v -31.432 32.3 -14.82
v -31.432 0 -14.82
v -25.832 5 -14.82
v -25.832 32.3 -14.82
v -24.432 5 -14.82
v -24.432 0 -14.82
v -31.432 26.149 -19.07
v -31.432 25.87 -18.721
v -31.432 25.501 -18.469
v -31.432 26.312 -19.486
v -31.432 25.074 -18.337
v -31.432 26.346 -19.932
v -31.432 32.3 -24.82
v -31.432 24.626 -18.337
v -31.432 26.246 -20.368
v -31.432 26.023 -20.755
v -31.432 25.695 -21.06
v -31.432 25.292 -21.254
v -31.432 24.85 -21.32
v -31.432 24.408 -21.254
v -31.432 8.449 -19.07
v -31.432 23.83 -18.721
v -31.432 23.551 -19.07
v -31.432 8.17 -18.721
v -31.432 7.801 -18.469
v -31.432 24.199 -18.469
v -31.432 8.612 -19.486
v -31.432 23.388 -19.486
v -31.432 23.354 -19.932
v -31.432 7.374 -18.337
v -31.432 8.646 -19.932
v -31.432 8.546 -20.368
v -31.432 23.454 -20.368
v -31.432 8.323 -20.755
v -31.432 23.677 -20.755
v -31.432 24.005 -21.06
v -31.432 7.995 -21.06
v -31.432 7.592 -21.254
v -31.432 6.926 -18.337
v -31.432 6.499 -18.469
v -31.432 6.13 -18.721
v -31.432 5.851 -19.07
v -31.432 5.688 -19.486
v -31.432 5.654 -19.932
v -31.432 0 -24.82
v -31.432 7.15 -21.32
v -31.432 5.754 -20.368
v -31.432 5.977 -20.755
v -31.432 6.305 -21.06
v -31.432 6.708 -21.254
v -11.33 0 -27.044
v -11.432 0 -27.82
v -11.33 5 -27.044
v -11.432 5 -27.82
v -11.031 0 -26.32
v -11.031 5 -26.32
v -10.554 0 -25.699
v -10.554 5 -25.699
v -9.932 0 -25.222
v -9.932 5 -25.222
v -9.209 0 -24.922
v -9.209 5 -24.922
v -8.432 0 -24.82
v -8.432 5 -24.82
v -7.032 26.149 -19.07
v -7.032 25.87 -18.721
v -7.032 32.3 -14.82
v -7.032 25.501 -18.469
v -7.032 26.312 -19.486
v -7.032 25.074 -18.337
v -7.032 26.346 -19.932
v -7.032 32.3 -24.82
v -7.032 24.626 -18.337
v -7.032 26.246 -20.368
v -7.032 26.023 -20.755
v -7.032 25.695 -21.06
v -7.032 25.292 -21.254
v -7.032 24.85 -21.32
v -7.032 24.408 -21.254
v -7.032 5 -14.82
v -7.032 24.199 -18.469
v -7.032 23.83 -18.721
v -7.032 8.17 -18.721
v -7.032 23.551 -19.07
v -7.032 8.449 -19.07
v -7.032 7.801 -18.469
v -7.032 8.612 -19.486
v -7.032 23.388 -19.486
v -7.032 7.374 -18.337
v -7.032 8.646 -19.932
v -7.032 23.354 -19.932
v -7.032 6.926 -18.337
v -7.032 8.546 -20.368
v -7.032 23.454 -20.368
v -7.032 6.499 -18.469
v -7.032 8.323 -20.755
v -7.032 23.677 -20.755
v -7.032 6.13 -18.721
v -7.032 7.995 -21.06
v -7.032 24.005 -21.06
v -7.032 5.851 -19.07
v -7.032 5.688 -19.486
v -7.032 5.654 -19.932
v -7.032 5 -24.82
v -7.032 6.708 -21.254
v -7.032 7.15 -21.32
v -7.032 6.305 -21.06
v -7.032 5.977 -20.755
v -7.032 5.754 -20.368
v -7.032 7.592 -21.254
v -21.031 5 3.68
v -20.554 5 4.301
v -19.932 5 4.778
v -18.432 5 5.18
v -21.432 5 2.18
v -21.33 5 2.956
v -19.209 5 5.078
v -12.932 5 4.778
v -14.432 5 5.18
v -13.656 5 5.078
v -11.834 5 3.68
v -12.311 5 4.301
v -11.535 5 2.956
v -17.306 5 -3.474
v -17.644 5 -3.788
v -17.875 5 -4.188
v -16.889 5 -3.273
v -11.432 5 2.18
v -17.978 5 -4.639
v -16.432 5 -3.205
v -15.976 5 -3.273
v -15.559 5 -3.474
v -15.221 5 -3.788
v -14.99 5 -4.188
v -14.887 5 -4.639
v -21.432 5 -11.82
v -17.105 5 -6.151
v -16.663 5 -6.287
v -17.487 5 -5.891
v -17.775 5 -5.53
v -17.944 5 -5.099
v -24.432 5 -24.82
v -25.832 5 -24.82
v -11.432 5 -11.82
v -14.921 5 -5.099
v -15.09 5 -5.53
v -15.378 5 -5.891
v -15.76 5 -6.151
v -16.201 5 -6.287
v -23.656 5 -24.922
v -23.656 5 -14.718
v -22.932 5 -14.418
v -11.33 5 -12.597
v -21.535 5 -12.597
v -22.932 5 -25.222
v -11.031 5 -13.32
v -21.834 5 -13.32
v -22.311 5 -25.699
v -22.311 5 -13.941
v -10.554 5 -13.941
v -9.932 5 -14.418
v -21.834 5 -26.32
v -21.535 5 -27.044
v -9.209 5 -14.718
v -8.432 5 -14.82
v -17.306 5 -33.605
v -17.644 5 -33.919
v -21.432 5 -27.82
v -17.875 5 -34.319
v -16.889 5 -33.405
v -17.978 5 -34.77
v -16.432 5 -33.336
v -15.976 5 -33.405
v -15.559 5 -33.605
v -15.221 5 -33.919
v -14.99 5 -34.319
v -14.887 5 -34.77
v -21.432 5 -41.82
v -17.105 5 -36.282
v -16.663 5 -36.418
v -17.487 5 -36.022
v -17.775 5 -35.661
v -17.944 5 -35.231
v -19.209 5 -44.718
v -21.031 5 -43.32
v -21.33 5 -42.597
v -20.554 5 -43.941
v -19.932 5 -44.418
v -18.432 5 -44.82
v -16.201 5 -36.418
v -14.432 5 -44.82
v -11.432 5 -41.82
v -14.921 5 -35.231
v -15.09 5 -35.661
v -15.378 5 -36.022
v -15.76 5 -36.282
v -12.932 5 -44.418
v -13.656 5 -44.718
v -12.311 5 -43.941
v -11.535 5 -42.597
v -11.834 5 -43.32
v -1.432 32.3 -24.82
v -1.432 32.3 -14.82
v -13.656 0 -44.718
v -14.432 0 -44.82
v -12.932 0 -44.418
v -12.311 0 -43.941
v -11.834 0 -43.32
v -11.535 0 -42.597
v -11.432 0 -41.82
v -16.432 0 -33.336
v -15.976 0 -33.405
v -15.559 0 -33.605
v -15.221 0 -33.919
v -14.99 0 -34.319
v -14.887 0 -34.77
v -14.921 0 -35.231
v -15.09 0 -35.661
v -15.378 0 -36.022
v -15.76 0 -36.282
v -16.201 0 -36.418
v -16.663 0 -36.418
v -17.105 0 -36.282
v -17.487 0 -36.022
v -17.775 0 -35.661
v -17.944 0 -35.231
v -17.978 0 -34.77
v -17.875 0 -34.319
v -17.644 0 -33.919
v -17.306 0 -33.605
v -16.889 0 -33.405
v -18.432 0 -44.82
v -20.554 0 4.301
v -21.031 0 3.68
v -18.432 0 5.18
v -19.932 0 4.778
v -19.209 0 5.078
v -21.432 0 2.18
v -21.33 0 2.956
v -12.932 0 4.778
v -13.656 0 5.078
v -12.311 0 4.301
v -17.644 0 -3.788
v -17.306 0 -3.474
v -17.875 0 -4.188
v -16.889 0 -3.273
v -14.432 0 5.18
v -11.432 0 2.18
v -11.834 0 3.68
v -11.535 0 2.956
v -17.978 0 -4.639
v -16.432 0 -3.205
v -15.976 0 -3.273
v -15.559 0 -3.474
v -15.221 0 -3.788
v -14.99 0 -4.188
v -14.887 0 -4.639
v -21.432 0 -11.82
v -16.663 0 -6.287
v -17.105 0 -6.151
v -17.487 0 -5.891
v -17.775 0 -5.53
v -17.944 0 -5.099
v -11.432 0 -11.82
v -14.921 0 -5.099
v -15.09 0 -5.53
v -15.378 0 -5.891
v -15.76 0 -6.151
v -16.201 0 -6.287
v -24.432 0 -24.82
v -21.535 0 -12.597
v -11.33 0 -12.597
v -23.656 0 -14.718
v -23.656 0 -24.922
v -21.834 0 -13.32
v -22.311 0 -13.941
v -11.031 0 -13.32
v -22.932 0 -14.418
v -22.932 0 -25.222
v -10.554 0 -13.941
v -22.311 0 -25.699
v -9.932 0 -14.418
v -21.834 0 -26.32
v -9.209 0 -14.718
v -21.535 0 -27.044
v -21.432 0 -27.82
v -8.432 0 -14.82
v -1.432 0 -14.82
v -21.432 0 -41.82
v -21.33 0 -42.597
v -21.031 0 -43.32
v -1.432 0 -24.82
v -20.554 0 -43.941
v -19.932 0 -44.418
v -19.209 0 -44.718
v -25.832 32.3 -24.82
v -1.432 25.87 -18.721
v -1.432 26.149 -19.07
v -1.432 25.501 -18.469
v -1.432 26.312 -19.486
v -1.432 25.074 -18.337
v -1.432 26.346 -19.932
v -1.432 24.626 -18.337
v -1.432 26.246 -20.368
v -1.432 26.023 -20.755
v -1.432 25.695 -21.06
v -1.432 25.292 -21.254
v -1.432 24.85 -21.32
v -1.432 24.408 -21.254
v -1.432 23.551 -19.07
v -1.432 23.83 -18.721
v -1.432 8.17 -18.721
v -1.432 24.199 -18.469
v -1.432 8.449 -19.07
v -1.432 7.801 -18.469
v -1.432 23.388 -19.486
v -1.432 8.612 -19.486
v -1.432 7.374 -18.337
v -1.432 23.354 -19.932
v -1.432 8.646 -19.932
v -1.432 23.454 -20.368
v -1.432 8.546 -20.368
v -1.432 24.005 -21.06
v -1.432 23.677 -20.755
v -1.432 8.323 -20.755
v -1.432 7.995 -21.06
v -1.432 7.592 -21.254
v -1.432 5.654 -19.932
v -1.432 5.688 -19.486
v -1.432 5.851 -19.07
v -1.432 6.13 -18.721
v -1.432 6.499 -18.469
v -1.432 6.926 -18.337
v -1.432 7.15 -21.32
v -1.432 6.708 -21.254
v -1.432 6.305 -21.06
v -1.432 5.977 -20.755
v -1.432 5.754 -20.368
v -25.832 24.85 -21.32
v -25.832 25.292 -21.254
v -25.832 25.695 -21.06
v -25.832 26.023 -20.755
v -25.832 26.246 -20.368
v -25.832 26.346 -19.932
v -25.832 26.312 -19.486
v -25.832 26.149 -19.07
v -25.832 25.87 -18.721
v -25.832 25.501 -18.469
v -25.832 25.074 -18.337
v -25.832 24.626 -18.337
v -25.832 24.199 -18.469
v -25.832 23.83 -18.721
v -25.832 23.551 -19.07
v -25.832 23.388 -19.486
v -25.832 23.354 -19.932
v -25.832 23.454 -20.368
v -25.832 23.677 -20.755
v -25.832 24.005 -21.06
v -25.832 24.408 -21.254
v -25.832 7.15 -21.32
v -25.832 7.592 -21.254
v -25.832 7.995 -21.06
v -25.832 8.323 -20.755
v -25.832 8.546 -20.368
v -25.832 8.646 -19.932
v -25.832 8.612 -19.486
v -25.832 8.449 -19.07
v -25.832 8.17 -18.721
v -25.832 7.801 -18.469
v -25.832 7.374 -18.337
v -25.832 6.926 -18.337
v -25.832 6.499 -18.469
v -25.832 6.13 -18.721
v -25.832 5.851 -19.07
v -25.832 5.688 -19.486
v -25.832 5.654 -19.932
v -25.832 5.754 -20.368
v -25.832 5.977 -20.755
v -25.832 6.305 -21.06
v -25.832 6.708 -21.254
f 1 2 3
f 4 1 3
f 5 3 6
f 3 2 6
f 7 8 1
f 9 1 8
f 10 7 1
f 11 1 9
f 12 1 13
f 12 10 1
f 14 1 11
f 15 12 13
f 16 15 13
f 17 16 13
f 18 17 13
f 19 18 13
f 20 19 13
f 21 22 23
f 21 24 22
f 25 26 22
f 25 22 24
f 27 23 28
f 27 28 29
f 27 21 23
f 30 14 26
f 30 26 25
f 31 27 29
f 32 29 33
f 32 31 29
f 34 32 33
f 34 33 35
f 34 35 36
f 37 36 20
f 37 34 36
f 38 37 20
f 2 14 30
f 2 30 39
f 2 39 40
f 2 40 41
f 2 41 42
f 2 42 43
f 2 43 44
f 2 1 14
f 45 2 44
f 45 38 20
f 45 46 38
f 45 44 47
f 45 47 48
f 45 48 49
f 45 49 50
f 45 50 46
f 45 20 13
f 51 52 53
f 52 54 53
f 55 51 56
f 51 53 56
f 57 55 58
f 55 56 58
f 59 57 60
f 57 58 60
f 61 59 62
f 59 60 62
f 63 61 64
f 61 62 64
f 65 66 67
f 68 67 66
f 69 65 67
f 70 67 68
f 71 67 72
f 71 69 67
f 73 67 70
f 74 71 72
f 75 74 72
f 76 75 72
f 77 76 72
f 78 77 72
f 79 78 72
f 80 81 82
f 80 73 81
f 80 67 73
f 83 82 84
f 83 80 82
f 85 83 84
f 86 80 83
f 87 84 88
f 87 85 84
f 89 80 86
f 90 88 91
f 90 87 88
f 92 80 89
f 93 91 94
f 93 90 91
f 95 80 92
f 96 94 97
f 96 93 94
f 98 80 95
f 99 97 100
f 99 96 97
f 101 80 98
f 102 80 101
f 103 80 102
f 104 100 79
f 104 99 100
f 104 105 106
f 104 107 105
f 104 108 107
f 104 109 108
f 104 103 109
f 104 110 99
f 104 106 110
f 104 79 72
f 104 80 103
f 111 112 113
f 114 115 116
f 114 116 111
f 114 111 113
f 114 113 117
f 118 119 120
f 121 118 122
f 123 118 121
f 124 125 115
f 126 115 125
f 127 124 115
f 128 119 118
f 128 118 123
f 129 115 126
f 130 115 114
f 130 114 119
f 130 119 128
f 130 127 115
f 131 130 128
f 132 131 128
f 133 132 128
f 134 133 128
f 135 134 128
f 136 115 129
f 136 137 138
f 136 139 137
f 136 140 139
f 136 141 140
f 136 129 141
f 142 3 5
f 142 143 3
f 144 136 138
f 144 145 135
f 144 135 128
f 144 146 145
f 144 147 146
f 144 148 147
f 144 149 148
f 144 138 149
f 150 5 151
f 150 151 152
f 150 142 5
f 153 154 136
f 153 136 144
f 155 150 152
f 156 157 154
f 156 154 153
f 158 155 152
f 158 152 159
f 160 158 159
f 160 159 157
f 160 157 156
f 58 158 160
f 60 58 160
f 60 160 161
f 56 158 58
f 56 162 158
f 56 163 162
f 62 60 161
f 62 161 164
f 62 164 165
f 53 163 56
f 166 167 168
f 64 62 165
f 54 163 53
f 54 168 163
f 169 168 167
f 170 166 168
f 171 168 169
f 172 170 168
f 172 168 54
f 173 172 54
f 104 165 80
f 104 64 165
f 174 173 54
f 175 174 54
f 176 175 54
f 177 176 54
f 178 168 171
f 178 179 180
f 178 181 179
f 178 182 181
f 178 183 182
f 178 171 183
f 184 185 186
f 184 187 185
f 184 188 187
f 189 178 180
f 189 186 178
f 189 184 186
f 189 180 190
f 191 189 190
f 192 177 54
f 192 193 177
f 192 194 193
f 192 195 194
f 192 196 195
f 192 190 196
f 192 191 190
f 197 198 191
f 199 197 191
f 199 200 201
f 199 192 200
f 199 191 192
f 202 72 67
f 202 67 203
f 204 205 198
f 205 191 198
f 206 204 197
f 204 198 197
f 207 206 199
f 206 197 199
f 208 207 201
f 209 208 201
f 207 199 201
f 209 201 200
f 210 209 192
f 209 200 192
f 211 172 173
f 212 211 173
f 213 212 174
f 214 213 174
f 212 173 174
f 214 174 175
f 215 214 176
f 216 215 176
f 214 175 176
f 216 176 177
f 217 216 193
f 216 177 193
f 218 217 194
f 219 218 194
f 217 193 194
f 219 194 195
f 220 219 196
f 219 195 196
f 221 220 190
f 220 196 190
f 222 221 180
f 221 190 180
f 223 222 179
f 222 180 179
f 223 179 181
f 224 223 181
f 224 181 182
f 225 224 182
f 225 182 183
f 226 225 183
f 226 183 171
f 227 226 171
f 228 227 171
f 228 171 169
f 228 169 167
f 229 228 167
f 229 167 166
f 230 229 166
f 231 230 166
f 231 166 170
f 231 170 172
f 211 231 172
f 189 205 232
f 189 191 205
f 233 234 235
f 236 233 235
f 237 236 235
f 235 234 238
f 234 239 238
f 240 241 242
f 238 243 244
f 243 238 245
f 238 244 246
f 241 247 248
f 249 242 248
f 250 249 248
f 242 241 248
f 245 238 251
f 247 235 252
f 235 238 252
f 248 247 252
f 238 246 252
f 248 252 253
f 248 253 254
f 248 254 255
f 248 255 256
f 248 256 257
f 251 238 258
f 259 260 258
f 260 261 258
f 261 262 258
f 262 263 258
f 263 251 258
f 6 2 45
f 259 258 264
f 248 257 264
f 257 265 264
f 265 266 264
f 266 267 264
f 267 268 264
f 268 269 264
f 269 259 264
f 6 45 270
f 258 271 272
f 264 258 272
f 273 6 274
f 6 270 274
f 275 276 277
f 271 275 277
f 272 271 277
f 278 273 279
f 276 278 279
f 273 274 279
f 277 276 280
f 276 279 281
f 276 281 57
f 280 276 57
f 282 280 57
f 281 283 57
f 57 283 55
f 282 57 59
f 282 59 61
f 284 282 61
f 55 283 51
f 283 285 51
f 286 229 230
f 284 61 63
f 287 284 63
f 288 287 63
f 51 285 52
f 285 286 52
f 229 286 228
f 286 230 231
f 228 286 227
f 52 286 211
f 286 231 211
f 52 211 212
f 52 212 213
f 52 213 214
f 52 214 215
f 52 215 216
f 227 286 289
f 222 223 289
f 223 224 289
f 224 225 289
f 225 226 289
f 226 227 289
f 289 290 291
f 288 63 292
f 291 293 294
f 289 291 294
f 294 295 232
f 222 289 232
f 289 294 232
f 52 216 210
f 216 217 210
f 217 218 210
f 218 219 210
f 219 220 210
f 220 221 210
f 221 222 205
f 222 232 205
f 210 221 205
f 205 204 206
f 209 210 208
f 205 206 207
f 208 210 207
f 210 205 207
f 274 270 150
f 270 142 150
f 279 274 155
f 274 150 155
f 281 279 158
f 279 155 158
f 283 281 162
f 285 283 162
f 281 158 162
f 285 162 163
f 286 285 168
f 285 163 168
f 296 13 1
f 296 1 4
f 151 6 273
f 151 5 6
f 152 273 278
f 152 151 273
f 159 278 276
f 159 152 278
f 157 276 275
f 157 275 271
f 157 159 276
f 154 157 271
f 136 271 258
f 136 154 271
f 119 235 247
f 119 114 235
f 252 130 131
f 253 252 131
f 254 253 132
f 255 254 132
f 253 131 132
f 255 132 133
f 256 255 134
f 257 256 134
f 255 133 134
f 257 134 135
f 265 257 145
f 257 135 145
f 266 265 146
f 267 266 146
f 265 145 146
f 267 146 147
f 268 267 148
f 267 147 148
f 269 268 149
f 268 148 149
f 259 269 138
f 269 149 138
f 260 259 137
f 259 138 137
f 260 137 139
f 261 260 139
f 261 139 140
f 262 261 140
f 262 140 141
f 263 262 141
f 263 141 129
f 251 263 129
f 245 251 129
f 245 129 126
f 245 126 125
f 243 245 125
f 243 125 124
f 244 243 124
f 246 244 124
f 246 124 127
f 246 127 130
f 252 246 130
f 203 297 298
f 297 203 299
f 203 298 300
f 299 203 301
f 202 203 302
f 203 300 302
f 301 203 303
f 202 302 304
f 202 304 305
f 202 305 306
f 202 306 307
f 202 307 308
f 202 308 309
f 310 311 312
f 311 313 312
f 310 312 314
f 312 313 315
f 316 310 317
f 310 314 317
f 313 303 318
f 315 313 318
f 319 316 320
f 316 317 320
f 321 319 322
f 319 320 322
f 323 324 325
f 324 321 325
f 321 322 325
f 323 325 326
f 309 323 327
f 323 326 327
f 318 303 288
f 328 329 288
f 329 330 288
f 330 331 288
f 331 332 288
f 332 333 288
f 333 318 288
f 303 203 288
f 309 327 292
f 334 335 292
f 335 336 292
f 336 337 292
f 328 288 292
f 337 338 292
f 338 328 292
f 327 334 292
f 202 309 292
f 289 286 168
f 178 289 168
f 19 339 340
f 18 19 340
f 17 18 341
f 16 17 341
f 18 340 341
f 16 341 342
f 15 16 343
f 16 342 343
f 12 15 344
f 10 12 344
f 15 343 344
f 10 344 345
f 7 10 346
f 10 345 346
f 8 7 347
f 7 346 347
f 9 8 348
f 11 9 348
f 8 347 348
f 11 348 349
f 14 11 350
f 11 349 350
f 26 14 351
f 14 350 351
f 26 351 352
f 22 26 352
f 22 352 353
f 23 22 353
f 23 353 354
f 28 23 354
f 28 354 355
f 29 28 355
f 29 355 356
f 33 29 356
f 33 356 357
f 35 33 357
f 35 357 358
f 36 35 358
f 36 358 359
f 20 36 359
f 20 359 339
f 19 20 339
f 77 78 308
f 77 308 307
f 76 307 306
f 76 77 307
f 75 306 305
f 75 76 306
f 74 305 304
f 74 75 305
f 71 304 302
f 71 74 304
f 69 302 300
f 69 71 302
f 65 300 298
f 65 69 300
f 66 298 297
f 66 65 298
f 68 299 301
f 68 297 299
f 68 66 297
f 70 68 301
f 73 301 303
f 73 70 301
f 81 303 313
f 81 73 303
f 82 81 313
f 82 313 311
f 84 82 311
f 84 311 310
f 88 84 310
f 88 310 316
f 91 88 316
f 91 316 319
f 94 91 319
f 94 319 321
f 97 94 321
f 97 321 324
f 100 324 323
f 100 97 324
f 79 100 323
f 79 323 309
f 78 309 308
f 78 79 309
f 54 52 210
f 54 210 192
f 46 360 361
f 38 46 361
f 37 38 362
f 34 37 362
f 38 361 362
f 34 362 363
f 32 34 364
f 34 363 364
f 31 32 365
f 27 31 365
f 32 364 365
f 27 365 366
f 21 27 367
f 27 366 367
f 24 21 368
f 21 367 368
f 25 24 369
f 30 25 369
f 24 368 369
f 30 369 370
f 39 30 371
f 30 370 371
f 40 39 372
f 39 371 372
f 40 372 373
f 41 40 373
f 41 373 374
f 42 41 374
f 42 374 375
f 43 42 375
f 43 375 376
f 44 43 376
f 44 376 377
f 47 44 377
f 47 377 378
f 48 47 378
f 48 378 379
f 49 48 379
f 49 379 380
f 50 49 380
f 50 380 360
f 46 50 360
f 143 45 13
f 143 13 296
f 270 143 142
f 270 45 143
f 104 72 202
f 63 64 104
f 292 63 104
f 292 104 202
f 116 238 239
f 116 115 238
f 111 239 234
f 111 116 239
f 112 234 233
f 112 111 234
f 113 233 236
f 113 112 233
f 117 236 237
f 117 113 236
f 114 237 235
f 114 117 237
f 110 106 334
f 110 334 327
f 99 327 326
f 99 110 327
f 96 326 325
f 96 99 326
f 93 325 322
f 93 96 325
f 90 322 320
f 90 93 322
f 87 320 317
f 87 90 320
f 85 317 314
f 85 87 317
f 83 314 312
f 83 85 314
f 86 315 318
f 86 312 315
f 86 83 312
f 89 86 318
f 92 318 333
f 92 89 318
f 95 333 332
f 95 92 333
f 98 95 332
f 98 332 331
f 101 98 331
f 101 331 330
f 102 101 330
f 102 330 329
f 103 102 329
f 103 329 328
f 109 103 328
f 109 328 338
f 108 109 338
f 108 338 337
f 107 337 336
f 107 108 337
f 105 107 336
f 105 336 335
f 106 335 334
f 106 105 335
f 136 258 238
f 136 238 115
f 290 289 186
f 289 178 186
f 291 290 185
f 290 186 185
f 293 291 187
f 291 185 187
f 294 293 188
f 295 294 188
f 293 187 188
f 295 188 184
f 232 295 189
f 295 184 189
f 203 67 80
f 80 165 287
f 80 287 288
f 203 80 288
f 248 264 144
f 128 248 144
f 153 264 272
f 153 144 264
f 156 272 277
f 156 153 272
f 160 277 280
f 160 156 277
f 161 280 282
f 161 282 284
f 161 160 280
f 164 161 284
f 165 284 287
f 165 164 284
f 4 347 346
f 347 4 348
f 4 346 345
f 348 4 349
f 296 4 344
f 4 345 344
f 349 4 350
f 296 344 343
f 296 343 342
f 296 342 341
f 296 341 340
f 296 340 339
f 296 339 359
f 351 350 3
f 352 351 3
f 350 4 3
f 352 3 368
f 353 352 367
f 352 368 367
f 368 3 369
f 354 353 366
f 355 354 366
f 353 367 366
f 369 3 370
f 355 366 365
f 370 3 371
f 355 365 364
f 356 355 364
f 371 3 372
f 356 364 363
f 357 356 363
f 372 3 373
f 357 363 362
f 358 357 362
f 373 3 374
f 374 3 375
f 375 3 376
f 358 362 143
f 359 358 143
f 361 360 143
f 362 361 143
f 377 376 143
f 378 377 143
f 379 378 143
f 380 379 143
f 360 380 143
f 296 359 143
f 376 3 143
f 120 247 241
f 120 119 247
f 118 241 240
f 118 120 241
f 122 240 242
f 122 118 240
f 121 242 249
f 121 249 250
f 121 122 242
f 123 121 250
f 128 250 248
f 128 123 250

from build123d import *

# Parameters (mm, degrees)
SKETCH1_W                      = 30
SKETCH1_H                      = 10
BOSS_EXTRUDE1_DEPTH            = 5
SKETCH2_W                      = 5.6
SKETCH2_H                      = 10
BOSS_EXTRUDE2_DEPTH            = 27.3
CUT_EXTRUDE1_REACH             = 49.484
SKETCH3_R                      = 1.5
CUT_EXTRUDE1_DIRECTION_2_REACH = 49.484
SKETCH4_W                      = 10
SKETCH4_H                      = 5
BOSS_EXTRUDE3_DEPTH            = 20
SKETCH5_W                      = 10
SKETCH5_H                      = 5
BOSS_EXTRUDE4_DEPTH            = 20
SKETCH6_R                      = 1.55
CUT_EXTRUDE2_DEPTH             = 62.172994556
FILLET1_R                      = 3


with BuildPart() as part:
    # Sketch1 → Boss-Extrude1 (new body)
    with BuildSketch(Plane(origin=(0, 0, 0), x_dir=(1, 0, 0), z_dir=(0, 1, 0))):
        with Locations((-16.432463279, 19.820146309)):
            Rectangle(SKETCH1_W, SKETCH1_H)
    extrude(amount=BOSS_EXTRUDE1_DEPTH)

    # Sketch2 → Boss-Extrude2 (add)
    with BuildSketch(Plane(origin=(0, 5, 0), x_dir=(1, 0, 0), z_dir=(0, 1, 0))):
        with Locations((-28.632463279, 19.820146309)):
            Rectangle(SKETCH2_W, SKETCH2_H)
        with Locations((-4.232463279, 19.820146309)):
            Rectangle(SKETCH2_W, SKETCH2_H)
    extrude(amount=BOSS_EXTRUDE2_DEPTH)

    # Cut-Extrude1: up to this face of the body (flat: up to its plane)
    cut_extrude1_end = Plane(part.part.faces().sort_by_distance((-31.432463279, 16.15, -19.820146309))[0])
    # Sketch3 → Cut-Extrude1 (cut, up to the picked face)
    with BuildSketch(Plane(origin=(-25.832463279, 0, 0), x_dir=(0, 0, -1), z_dir=(1, 0, 0)), mode=Mode.PRIVATE) as cut_extrude1_sk1:
        with Locations((19.820146309, 7.15)):
            Circle(SKETCH3_R)
    cut_extrude1_tool1 = split(extrude(cut_extrude1_sk1.sketch, amount=-CUT_EXTRUDE1_REACH, mode=Mode.PRIVATE), bisect_by=cut_extrude1_end, keep=Keep.BOTH, mode=Mode.PRIVATE)
    # Sketch3 → Cut-Extrude1 (cut, up to the picked face)
    with BuildSketch(Plane(origin=(-25.832463279, 0, 0), x_dir=(0, 0, -1), z_dir=(1, 0, 0)), mode=Mode.PRIVATE) as cut_extrude1_sk2:
        with Locations((19.820146309, 24.85)):
            Circle(SKETCH3_R)
    cut_extrude1_tool2 = split(extrude(cut_extrude1_sk2.sketch, amount=-CUT_EXTRUDE1_REACH, mode=Mode.PRIVATE), bisect_by=cut_extrude1_end, keep=Keep.BOTH, mode=Mode.PRIVATE)
    add(cut_extrude1_tool1.solids().sort_by(Axis((-25.832463, 7.15, -19.820146), (-1, 0, 0)))[0], mode=Mode.SUBTRACT)
    add(cut_extrude1_tool2.solids().sort_by(Axis((-25.832463, 24.85, -19.820146), (-1, 0, 0)))[0], mode=Mode.SUBTRACT)

    # Cut-Extrude1 direction 2: up to this face of the body (flat: up to its plane)
    cut_extrude1_direction_2_end = Plane(part.part.faces().sort_by_distance((-1.432463279, 16.15, -19.820146309))[0])
    # Sketch3 → Cut-Extrude1 direction 2 (cut, up to the picked face)
    with BuildSketch(Plane(origin=(-25.832463279, 0, 0), x_dir=(0, 0, -1), z_dir=(1, 0, 0)), mode=Mode.PRIVATE) as cut_extrude1_direction_2_sk1:
        with Locations((19.820146309, 7.15)):
            Circle(SKETCH3_R)
    cut_extrude1_direction_2_tool1 = split(extrude(cut_extrude1_direction_2_sk1.sketch, amount=CUT_EXTRUDE1_DIRECTION_2_REACH, mode=Mode.PRIVATE), bisect_by=cut_extrude1_direction_2_end, keep=Keep.BOTH, mode=Mode.PRIVATE)
    # Sketch3 → Cut-Extrude1 direction 2 (cut, up to the picked face)
    with BuildSketch(Plane(origin=(-25.832463279, 0, 0), x_dir=(0, 0, -1), z_dir=(1, 0, 0)), mode=Mode.PRIVATE) as cut_extrude1_direction_2_sk2:
        with Locations((19.820146309, 24.85)):
            Circle(SKETCH3_R)
    cut_extrude1_direction_2_tool2 = split(extrude(cut_extrude1_direction_2_sk2.sketch, amount=CUT_EXTRUDE1_DIRECTION_2_REACH, mode=Mode.PRIVATE), bisect_by=cut_extrude1_direction_2_end, keep=Keep.BOTH, mode=Mode.PRIVATE)
    add(cut_extrude1_direction_2_tool1.solids().sort_by(Axis((-25.832463, 7.15, -19.820146), (1, 0, 0)))[0], mode=Mode.SUBTRACT)
    add(cut_extrude1_direction_2_tool2.solids().sort_by(Axis((-25.832463, 24.85, -19.820146), (1, 0, 0)))[0], mode=Mode.SUBTRACT)

    # Sketch4 → Boss-Extrude3 (add)
    with BuildSketch(Plane(origin=(0, 0, -24.820146309), x_dir=(-1, 0, 0), z_dir=(0, 0, -1))):
        with Locations((16.432463279, 2.5)):
            Rectangle(SKETCH4_W, SKETCH4_H)
    extrude(amount=BOSS_EXTRUDE3_DEPTH)

    # Sketch5 → Boss-Extrude4 (add)
    with BuildSketch(Plane.XY.offset(-14.820146309)):
        with Locations((-16.432463279, 2.5)):
            Rectangle(SKETCH5_W, SKETCH5_H)
    extrude(amount=BOSS_EXTRUDE4_DEPTH)

    # Sketch6 → Cut-Extrude2 (cut, through all)
    with BuildSketch(Plane(origin=(0, 5, 0), x_dir=(1, 0, 0), z_dir=(0, 1, 0))):
        with Locations(Location((-16.432463279, 34.885731697, 0), (0, 0, 270))):
            Circle(SKETCH6_R)
        with Locations(Location((-16.432463279, 4.754560921, 0), (0, 0, 270))):
            Circle(SKETCH6_R)
    extrude(amount=-CUT_EXTRUDE2_DEPTH, mode=Mode.SUBTRACT)

    # Fillet1
    fillet1_edges = [part.edges().sort_by_distance(p)[0] for p in [
        (-21.432463279, 2.5, -24.820146309),
        (-21.432463279, 2.5, -44.820146309),
        (-11.432463279, 2.5, -44.820146309),
        (-11.432463279, 2.5, -24.820146309),
        (-11.432463279, 2.5, -14.820146309),
        (-21.432463279, 2.5, -14.820146309),
        (-11.432463279, 2.5, 5.179853691),
        (-21.432463279, 2.5, 5.179853691),
    ]]
    fillet(fillet1_edges, radius=FILLET1_R)


solid = part.part
